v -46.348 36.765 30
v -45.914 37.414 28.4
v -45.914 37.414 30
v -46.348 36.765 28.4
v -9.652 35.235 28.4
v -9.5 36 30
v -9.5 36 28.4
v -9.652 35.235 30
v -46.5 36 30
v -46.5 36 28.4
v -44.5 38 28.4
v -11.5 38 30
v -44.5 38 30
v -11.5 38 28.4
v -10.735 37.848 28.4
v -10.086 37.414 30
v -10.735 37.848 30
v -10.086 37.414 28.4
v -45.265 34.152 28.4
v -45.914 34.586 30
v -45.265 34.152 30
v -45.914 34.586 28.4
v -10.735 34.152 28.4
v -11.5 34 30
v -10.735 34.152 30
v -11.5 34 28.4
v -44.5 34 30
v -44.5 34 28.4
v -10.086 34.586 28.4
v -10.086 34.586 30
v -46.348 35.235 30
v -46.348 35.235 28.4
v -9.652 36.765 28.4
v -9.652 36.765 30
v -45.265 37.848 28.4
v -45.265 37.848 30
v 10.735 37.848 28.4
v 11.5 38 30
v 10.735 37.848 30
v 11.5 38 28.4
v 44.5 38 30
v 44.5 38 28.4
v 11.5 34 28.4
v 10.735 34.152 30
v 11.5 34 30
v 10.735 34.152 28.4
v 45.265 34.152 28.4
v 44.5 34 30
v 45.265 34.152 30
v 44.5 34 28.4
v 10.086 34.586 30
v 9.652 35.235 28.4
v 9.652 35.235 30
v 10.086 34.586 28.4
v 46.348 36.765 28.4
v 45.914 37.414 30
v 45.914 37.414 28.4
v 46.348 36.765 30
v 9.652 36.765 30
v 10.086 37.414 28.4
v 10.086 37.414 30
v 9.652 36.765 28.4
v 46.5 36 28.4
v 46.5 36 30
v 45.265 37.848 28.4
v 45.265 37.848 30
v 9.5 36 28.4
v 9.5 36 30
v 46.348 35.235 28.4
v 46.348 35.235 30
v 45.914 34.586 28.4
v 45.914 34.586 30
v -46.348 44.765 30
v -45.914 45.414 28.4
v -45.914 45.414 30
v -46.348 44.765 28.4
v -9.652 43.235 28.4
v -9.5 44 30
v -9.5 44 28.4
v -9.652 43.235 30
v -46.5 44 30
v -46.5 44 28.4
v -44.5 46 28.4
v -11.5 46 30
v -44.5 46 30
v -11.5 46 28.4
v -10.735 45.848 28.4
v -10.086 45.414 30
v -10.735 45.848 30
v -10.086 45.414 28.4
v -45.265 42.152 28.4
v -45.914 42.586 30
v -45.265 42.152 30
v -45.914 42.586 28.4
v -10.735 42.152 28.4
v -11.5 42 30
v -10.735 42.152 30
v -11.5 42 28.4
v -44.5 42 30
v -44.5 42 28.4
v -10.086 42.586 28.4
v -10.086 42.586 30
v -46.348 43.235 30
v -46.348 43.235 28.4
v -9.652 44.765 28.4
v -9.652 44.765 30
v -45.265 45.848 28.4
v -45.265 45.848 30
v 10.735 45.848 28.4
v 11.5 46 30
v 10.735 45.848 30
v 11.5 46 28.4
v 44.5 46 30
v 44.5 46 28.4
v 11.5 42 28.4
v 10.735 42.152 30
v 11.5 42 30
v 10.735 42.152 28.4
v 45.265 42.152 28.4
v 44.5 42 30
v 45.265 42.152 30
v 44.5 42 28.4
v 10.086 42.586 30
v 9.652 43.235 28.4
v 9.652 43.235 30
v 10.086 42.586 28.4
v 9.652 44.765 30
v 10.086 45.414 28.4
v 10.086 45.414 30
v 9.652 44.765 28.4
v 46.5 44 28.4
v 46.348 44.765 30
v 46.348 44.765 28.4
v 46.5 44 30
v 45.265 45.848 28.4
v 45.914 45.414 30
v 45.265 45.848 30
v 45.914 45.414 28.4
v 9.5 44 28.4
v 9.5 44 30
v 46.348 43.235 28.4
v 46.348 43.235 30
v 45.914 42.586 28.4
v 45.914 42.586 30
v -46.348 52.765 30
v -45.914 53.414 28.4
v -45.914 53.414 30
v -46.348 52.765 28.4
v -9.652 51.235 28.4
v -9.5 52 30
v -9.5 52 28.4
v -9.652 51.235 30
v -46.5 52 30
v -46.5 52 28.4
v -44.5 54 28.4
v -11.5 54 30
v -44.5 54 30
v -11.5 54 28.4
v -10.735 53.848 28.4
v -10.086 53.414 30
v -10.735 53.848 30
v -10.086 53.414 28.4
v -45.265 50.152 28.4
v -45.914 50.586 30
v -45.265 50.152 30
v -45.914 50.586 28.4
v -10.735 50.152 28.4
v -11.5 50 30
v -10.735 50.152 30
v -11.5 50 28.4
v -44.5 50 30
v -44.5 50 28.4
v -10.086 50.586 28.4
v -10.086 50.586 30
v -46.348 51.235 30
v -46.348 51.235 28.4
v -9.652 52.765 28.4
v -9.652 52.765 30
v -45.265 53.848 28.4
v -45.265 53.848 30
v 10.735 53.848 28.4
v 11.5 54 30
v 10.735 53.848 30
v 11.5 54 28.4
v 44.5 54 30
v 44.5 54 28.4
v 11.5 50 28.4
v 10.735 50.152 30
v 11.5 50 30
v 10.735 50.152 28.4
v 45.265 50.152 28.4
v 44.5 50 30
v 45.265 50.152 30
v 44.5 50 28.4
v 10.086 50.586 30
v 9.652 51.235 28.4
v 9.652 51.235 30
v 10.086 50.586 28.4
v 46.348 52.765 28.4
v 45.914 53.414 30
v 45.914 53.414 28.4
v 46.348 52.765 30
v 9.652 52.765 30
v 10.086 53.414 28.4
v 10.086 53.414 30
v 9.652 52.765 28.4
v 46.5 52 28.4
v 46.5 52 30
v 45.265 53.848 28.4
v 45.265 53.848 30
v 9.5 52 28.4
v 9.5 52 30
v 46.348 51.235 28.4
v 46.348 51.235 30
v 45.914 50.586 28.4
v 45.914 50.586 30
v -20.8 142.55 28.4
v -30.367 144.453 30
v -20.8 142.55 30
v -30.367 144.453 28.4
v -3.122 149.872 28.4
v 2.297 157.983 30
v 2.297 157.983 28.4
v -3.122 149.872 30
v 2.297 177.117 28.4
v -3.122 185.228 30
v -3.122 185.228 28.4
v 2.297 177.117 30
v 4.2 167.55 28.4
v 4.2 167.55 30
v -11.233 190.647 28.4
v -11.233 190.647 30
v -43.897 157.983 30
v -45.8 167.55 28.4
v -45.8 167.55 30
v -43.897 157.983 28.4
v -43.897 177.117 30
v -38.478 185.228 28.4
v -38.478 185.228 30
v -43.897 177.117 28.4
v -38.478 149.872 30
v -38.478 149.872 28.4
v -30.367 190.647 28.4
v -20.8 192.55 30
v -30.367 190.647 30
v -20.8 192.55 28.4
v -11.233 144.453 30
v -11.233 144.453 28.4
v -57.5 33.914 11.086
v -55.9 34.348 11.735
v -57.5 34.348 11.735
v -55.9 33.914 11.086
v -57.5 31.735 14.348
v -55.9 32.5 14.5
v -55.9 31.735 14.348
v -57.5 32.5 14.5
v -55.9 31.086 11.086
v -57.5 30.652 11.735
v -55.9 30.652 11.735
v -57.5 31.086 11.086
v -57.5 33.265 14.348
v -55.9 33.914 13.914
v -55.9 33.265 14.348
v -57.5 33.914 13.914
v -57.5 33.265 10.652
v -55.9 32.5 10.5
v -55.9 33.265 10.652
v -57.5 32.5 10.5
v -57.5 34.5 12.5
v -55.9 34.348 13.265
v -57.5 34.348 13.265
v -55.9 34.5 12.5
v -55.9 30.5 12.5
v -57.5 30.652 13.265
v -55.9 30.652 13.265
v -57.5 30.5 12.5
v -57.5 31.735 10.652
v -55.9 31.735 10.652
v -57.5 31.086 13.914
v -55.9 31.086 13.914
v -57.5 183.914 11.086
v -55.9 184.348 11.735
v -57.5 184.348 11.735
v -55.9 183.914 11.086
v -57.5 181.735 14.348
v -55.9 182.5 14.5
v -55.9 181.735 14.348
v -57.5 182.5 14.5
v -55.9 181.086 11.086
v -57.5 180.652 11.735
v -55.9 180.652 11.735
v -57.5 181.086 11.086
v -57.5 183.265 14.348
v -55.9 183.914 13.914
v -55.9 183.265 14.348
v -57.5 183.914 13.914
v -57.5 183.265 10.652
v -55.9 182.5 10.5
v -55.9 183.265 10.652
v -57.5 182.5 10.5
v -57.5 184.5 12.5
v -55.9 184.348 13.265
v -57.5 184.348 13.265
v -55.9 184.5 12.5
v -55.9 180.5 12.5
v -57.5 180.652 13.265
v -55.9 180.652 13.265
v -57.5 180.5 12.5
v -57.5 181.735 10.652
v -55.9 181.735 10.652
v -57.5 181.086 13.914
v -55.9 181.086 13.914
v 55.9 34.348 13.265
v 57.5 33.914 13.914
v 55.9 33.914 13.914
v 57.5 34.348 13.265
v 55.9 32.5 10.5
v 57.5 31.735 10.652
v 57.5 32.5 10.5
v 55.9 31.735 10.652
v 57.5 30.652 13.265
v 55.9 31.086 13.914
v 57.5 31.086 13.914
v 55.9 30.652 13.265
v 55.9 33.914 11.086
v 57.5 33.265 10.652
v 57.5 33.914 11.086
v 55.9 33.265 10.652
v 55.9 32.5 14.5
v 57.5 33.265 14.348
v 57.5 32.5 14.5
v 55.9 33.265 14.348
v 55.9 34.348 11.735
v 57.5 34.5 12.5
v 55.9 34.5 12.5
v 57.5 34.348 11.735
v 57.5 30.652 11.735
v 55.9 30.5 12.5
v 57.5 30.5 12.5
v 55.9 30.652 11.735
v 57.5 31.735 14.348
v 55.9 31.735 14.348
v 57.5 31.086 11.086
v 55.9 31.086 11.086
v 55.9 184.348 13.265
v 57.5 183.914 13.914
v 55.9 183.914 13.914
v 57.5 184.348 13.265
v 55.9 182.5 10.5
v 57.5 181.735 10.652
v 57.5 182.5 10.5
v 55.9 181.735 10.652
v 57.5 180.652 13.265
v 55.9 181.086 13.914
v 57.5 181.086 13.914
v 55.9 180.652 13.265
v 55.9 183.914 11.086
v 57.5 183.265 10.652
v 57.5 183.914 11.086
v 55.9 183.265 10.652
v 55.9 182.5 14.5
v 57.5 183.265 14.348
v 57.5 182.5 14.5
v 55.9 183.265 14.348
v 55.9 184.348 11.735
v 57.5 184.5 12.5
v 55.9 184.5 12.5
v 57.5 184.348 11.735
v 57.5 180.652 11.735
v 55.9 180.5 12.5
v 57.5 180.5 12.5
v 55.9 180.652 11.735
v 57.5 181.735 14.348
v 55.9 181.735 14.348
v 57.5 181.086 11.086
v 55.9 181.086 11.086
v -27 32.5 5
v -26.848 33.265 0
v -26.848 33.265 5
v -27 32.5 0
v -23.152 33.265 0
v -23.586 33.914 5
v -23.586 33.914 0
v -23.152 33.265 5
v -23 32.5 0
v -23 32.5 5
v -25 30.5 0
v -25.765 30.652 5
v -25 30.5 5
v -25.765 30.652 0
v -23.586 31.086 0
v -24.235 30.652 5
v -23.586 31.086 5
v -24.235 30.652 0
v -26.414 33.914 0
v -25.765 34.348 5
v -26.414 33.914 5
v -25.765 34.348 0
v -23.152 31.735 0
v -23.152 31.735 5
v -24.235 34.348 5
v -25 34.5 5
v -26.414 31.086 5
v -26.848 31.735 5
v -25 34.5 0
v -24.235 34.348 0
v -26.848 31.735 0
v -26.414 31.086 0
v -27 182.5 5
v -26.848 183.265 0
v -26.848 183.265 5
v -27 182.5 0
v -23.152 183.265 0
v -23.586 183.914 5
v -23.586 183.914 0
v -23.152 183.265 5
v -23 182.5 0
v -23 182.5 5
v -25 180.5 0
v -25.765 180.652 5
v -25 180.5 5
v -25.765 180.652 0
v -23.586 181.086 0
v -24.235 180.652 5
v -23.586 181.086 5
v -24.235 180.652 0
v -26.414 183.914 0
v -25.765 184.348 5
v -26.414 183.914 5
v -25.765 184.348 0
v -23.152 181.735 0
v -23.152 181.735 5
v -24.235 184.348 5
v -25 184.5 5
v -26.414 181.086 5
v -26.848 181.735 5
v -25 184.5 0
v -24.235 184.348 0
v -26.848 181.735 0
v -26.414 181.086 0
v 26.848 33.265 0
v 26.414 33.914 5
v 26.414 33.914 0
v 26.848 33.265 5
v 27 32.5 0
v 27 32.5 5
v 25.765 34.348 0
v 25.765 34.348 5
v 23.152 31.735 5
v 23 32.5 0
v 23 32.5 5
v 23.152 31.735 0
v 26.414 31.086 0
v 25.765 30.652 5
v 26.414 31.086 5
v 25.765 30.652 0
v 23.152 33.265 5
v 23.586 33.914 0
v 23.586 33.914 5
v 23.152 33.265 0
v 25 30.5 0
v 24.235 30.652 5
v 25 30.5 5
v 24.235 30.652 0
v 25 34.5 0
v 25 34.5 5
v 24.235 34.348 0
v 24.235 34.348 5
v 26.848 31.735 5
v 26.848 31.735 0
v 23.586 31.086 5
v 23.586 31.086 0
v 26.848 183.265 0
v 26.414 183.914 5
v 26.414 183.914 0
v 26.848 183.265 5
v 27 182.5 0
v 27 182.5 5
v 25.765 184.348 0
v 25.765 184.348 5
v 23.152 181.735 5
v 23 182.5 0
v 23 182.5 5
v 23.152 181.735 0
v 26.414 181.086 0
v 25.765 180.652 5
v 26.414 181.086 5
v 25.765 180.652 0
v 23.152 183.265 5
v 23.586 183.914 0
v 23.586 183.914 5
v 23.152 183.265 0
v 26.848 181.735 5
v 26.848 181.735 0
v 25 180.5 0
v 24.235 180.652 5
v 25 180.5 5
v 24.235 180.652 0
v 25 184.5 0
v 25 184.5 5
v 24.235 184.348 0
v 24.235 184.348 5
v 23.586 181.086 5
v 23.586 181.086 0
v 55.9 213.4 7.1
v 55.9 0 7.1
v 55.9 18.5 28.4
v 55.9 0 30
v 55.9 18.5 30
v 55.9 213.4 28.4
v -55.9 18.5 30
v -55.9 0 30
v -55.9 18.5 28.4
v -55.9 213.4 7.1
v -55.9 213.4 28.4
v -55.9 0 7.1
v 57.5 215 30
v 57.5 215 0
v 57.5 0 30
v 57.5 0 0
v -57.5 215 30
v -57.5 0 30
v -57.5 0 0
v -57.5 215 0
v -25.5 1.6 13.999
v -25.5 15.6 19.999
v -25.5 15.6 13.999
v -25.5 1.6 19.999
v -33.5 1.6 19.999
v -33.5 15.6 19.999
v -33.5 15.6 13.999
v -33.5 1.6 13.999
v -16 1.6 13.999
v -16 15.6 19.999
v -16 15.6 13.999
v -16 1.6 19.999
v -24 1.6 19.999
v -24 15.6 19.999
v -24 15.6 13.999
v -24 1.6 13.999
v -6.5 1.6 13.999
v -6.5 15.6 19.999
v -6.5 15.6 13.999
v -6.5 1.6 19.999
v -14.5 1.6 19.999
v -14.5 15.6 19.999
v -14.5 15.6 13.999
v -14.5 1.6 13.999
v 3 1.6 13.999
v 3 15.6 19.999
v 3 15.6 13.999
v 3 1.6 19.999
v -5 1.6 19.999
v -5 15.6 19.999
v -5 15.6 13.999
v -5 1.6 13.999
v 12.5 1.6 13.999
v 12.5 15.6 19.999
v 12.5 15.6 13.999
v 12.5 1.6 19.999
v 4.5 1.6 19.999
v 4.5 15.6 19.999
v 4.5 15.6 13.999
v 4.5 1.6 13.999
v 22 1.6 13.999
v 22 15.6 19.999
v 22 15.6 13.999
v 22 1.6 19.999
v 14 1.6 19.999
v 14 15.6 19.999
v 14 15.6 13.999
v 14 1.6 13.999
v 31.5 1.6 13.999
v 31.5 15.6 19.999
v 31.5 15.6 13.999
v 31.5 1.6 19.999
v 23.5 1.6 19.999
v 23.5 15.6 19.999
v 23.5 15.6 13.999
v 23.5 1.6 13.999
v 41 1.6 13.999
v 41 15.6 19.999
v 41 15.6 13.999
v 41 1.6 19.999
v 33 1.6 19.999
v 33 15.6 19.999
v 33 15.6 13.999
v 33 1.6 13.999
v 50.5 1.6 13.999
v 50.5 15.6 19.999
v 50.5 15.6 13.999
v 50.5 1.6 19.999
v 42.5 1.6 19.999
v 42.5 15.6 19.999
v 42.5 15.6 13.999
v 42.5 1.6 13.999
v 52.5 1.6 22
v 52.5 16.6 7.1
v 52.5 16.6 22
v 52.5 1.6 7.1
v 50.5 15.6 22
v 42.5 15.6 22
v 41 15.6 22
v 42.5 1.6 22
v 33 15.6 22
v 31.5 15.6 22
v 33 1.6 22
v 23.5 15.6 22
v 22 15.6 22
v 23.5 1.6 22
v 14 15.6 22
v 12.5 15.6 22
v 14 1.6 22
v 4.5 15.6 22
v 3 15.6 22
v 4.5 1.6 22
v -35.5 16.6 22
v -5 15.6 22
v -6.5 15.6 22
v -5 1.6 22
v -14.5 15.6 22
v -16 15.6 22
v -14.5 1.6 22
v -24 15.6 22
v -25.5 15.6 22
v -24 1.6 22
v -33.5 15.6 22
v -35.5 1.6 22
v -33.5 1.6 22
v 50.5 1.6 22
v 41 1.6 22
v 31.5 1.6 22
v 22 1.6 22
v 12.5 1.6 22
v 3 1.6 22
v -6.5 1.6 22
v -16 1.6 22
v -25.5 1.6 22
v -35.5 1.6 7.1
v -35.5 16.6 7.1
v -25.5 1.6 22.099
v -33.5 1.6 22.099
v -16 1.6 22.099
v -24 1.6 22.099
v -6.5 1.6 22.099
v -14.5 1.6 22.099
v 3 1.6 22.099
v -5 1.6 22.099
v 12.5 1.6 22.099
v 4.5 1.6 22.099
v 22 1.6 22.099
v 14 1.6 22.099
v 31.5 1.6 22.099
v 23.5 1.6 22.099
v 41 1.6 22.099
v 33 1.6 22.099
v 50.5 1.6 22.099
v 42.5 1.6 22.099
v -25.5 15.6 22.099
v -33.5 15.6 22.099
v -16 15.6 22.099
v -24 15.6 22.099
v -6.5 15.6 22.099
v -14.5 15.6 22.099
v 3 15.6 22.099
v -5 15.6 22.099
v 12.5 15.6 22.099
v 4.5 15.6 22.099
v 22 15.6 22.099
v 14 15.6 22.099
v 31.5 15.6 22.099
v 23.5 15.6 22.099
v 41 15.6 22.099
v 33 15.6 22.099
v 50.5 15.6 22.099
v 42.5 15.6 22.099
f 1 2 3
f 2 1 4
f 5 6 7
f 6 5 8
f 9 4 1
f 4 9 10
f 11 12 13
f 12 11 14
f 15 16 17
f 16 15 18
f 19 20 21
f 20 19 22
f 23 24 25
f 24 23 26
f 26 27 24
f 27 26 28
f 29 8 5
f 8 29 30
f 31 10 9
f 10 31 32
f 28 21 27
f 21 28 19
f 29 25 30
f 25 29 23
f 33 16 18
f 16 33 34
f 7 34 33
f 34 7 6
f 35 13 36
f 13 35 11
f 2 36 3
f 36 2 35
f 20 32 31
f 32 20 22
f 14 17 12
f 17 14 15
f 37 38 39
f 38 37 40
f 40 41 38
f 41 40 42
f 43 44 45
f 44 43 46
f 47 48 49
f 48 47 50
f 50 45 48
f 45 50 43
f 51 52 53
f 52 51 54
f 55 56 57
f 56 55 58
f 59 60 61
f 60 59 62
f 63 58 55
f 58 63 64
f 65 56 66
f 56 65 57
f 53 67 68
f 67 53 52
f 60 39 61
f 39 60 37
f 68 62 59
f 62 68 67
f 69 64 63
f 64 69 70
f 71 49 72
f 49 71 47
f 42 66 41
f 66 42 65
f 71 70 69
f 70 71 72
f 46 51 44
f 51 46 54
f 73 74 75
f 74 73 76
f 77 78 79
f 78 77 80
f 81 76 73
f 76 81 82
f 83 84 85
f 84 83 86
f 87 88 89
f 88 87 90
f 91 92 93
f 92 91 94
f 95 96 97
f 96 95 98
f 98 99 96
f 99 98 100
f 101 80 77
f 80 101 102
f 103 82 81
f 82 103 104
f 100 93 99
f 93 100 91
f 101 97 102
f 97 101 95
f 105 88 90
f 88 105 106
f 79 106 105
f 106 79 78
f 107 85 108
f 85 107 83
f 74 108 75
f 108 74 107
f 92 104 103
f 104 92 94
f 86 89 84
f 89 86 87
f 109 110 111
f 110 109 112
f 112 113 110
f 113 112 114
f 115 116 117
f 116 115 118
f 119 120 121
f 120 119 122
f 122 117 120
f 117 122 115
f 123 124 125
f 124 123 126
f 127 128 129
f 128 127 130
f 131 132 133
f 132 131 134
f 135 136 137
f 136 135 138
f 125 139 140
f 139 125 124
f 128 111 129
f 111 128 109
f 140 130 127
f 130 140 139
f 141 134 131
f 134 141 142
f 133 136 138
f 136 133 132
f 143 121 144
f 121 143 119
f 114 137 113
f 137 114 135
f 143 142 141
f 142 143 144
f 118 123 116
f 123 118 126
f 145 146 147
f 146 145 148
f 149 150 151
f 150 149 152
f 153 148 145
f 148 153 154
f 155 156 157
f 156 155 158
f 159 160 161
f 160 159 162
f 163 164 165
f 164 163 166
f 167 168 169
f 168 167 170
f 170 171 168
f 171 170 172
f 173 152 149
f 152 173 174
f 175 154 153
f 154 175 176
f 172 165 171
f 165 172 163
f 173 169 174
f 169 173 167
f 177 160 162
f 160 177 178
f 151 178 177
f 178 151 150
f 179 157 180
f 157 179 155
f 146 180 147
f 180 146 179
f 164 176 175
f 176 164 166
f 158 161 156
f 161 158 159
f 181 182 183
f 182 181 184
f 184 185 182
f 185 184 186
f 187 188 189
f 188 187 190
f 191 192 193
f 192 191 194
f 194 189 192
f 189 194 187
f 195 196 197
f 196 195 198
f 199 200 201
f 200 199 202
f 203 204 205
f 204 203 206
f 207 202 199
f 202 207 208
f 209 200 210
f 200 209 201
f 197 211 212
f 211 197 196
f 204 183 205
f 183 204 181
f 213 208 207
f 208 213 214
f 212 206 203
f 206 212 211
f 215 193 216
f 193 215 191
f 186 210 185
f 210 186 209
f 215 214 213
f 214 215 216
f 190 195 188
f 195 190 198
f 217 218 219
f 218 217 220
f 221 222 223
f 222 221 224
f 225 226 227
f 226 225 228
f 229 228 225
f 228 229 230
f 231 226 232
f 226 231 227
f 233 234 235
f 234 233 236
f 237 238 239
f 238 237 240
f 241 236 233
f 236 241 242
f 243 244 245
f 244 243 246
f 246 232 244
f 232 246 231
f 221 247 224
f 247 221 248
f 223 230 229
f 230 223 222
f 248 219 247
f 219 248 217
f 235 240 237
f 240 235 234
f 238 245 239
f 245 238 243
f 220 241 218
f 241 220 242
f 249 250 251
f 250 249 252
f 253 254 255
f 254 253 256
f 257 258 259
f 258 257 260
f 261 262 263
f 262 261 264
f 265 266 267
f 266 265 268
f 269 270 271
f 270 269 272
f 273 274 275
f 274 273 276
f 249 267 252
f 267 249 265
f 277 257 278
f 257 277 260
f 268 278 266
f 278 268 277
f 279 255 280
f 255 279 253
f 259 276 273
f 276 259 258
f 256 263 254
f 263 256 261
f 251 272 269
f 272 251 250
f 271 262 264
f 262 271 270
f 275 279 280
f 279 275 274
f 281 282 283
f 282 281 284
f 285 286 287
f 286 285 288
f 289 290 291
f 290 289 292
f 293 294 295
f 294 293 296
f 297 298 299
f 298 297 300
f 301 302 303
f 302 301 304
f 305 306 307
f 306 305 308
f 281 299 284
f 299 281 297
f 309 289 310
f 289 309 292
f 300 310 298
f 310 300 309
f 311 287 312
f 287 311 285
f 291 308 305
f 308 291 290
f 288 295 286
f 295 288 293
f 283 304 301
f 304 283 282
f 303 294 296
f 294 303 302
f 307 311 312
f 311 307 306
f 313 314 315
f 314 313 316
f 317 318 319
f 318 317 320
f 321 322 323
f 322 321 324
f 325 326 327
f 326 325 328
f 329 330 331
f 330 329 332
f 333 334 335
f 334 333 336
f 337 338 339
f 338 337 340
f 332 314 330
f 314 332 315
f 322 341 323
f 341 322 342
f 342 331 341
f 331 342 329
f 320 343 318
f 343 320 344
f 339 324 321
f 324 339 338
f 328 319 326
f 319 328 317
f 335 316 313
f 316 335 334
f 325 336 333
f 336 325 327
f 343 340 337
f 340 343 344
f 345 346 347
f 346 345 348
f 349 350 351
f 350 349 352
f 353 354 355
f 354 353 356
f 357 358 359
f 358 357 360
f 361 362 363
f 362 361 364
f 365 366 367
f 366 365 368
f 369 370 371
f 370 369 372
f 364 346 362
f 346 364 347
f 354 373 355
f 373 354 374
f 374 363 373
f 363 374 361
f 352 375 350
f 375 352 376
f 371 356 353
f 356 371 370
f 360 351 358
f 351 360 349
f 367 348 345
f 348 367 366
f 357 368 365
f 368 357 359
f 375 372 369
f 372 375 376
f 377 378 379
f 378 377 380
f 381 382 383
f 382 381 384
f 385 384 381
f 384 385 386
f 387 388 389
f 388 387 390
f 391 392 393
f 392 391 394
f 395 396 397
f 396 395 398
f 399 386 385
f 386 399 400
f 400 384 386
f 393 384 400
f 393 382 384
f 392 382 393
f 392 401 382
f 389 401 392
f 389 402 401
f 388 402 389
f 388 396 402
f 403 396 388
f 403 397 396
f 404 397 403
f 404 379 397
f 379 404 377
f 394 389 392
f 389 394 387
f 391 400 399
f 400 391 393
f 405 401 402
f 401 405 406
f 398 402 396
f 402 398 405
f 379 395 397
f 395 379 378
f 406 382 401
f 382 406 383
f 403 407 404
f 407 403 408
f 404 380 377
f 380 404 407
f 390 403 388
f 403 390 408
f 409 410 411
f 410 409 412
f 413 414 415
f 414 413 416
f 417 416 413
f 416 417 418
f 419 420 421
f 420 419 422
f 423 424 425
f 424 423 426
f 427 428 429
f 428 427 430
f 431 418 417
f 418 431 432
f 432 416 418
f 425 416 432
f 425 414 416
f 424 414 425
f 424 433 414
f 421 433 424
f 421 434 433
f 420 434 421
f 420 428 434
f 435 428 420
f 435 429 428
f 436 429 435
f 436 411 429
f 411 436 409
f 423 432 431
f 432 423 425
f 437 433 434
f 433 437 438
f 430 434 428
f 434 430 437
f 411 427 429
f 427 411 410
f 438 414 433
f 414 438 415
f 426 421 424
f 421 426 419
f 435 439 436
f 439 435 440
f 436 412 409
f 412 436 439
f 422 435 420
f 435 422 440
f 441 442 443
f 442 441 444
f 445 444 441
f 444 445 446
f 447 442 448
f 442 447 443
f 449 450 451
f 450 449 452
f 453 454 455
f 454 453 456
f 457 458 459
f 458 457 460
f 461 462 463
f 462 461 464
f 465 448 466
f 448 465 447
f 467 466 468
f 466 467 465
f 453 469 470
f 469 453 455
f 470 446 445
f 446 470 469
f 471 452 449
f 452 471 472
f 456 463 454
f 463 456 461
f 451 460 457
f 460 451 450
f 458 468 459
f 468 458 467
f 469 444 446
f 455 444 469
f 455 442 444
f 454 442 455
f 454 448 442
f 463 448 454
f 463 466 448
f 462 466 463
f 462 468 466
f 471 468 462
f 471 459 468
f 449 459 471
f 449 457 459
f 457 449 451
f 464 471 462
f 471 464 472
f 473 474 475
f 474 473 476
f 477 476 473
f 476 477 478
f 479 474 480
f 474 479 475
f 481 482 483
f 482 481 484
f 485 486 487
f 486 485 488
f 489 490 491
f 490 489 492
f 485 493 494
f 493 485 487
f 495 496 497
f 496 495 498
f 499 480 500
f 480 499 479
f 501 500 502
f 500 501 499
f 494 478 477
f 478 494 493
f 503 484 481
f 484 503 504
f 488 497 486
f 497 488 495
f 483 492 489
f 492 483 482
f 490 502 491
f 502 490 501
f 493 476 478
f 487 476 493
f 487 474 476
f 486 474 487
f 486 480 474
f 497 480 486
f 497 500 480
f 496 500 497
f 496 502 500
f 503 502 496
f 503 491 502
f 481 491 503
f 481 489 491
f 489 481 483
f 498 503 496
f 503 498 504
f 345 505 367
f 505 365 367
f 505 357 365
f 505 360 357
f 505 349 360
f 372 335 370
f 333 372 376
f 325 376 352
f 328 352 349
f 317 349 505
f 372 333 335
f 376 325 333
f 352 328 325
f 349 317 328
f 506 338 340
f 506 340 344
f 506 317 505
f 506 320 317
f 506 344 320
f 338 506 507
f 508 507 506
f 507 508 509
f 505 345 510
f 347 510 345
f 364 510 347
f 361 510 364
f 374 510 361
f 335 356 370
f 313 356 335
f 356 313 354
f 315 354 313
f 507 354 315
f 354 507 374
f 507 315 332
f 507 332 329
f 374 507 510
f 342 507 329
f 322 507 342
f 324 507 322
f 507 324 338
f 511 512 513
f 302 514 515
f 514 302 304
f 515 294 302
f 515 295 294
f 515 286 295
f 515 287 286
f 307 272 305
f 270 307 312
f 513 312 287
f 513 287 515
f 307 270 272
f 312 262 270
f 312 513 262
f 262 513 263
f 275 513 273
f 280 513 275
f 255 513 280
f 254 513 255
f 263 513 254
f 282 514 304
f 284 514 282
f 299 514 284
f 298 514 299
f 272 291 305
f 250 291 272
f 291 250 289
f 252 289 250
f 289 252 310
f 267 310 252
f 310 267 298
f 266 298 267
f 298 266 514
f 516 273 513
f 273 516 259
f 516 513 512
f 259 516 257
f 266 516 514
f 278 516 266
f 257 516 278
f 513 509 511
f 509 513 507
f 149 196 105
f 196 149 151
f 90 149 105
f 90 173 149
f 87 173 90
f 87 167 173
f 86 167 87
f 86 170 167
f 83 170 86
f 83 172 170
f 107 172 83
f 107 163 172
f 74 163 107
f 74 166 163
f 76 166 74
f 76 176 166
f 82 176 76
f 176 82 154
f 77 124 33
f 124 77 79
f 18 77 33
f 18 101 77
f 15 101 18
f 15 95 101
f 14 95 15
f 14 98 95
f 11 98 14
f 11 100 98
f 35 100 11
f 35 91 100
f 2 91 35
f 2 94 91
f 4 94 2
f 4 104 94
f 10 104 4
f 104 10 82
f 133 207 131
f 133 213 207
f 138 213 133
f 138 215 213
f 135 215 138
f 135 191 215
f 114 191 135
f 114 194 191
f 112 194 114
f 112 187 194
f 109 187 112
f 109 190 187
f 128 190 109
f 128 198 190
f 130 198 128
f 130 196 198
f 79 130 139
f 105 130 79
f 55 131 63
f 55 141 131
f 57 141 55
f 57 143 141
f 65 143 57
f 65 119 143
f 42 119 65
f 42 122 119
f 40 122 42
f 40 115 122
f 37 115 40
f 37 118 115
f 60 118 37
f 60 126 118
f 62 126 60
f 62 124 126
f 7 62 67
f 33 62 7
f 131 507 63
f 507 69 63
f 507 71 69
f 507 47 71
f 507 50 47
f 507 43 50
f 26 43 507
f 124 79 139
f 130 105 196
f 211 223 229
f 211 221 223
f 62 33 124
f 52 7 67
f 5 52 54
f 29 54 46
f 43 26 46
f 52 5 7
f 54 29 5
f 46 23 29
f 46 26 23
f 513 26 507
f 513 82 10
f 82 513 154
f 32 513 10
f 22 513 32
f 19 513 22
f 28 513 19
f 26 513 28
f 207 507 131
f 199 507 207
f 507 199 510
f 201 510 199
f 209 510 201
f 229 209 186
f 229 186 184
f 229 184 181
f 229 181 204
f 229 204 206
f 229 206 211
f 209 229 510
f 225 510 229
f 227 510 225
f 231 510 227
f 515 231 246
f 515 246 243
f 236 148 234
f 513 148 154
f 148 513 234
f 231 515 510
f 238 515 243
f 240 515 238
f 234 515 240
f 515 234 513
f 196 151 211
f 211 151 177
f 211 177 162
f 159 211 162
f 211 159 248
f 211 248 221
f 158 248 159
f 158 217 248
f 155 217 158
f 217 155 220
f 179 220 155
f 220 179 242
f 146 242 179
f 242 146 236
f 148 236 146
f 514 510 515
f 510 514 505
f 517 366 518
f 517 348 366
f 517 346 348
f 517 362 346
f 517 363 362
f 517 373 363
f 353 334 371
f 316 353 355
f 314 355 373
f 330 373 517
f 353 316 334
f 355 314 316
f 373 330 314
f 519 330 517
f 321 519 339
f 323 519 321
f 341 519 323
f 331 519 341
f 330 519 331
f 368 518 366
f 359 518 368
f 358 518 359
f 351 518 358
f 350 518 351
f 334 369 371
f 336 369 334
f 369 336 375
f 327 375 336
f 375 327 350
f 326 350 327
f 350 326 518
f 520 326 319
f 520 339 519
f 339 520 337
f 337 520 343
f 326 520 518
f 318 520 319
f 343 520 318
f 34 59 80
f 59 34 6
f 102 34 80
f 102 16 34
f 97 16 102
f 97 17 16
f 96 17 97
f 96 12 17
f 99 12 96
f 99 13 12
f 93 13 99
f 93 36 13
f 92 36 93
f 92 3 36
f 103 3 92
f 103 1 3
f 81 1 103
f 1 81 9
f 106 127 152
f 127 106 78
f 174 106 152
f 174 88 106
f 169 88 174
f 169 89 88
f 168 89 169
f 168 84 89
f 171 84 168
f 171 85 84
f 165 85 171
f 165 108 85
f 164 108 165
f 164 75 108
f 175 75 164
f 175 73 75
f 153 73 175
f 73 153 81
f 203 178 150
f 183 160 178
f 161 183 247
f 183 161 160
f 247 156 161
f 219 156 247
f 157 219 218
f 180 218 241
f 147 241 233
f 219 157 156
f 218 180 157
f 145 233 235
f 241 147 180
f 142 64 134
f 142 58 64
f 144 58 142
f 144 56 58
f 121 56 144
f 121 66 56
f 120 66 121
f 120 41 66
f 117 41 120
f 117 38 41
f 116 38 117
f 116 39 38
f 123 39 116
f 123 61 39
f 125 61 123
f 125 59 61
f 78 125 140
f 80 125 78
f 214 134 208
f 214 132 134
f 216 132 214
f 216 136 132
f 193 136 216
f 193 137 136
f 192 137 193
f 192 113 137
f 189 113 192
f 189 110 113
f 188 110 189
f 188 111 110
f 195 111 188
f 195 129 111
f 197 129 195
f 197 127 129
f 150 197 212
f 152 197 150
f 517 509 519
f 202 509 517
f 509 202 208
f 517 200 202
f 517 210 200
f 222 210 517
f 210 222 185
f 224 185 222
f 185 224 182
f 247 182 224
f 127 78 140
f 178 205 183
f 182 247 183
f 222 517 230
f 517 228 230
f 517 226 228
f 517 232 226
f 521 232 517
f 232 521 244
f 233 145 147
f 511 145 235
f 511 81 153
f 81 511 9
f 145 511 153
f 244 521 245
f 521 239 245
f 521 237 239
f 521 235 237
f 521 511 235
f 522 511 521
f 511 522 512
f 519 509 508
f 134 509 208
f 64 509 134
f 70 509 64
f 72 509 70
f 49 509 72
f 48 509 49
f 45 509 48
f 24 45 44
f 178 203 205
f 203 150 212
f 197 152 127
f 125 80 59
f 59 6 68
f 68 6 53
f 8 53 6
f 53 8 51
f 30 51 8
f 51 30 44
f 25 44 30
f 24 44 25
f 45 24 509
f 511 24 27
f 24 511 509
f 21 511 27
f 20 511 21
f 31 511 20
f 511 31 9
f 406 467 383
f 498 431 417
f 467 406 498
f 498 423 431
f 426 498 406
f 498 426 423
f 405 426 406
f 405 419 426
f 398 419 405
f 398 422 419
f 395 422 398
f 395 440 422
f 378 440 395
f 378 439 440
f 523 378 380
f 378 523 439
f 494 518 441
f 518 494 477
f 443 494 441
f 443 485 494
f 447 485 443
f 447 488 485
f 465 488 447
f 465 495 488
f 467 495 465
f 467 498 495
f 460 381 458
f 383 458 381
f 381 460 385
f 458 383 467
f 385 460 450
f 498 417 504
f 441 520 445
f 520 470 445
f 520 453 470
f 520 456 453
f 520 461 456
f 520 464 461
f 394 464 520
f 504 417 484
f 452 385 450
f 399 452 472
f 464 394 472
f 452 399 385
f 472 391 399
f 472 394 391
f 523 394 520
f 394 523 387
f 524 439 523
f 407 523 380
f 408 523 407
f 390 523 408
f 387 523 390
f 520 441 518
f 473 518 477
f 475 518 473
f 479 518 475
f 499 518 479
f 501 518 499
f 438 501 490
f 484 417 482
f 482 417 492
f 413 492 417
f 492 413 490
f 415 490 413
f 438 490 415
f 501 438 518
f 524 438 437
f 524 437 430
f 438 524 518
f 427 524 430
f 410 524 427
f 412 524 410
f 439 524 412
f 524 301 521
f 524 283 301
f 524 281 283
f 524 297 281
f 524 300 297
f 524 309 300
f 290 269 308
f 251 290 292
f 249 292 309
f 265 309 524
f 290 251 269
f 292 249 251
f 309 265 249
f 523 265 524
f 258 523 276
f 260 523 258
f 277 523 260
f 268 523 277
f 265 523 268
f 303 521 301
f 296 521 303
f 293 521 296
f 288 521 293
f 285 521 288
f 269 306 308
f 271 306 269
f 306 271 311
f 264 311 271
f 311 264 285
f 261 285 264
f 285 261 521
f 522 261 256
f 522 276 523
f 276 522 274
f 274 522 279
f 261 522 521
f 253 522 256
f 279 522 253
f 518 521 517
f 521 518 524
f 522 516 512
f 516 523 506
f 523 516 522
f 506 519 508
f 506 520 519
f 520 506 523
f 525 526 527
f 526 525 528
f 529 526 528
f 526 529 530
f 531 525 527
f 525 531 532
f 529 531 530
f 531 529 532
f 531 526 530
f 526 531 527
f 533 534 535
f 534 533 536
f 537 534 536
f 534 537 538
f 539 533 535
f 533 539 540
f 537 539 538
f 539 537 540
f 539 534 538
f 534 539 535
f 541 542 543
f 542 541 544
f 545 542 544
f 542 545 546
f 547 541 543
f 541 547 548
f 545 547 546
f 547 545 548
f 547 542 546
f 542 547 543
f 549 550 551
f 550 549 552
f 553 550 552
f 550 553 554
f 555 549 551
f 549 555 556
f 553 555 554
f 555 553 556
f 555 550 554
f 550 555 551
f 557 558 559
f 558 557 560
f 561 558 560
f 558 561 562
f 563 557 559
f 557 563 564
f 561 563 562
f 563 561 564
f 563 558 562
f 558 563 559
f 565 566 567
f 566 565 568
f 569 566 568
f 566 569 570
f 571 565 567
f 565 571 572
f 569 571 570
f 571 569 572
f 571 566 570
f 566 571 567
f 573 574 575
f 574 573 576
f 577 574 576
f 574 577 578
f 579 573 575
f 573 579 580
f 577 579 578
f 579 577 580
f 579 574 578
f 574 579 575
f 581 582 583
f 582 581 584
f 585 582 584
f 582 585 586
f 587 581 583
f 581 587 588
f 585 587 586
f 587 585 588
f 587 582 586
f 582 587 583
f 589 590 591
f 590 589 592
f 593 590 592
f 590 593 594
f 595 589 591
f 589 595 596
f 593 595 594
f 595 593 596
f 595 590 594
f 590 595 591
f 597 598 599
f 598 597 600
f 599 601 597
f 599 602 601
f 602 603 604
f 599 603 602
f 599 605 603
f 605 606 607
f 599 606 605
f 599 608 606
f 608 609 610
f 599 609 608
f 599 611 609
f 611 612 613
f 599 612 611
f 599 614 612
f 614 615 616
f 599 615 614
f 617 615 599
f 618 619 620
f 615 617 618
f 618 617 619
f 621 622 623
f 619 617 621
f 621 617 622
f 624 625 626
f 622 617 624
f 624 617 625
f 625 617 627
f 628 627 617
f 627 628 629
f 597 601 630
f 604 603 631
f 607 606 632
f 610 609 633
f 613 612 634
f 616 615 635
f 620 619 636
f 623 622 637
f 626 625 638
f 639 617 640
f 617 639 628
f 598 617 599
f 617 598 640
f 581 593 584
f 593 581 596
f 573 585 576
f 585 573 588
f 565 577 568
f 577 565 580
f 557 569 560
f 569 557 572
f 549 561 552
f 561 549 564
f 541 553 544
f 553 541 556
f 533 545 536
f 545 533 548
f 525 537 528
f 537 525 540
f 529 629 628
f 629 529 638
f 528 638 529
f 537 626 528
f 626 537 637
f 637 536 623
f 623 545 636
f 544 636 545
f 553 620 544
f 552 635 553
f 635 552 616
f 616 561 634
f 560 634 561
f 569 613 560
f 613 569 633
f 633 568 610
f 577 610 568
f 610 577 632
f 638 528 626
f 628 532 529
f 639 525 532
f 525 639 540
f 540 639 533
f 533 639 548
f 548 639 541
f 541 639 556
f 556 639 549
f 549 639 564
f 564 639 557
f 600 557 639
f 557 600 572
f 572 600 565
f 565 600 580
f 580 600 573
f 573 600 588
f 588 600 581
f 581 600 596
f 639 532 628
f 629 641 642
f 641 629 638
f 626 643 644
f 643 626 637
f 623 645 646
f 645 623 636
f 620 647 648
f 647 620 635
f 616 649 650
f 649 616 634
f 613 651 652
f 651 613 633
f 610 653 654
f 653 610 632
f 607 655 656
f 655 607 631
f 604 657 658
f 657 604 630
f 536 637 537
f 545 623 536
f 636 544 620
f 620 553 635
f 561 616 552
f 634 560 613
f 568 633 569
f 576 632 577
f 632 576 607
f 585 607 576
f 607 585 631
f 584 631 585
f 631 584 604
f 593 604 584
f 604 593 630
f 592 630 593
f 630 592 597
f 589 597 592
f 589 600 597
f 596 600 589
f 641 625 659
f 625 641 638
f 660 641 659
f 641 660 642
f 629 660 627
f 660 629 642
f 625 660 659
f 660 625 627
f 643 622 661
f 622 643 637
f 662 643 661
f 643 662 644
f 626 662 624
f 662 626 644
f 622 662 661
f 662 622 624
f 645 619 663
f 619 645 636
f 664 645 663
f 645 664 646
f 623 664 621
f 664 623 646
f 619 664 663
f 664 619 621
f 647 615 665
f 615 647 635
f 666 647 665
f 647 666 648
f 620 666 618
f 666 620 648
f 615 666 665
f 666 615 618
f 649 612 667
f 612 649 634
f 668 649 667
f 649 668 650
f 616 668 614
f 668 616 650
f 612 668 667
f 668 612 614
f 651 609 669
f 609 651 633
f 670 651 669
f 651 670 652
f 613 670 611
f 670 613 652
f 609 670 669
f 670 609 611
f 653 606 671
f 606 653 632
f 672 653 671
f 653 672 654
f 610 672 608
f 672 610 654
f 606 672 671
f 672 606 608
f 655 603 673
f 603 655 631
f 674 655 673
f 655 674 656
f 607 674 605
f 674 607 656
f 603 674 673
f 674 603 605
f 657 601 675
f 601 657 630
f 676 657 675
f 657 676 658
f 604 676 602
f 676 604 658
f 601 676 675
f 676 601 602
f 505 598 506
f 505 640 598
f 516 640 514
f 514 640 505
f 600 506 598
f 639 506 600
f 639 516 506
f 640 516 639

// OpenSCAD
e=.001;
$fn=16;

mw_lrs_w=115;
mw_lrs_h=30;
mw_lrs_d=215;


mw_lrs_holes_pitch_d  = 150;
mw_lrs_holes_pitch_w  = 50;
mw_lrs_holes_height_h = 12.5;

mw_lrs_gap_h = 23;
mw_lrs_gap_d = 18.5;

mw_lrs_case_thickness = 1.6;

m4_thread = 4;

mw_lrs_screw_terminal_x=8.5;
mw_lrs_screw_terminal_w=88;
mw_lrs_screw_terminal_d=15;
mw_lrs_screw_terminal_h=15;
mw_lrs_screw_terminal_pitch = 9.5;
mw_lrs_screw_terminal_gap_w = 8;
mw_lrs_screw_terminal_gap_d = 14;
mw_lrs_screw_terminal_gap_z = 7;
mw_lrs_screw_terminal_gap_h = 6;

module mw_lrs_side_holes()
{
	translate( [0, 0, mw_lrs_holes_height_h] )
	for( r = [ 0, 180 ] )
	rotate( [0, r, 0] )
	for( y = [ (mw_lrs_d-mw_lrs_holes_pitch_d)/2, (mw_lrs_d+mw_lrs_holes_pitch_d)/2 ] )
	translate( [-mw_lrs_w/2, y, 0] )
	rotate( [0, 90, 0] )
	children();
}

module mw_lrs_bottom_holes()
{
	for( x = [ -mw_lrs_holes_pitch_w/2, mw_lrs_holes_pitch_w/2 ] )
	for( y = [ (mw_lrs_d-mw_lrs_holes_pitch_d)/2, (mw_lrs_d+mw_lrs_holes_pitch_d)/2 ] )
	translate( [x, y, 0] )
	children();
}

module mw_lrs_holes()
{
	mw_lrs_side_holes() children();
	mw_lrs_bottom_holes() children();
}

module mw_lrs_screw_terminal()
{
	colors = [
		"red", "red", "red",
		"black", "black", "black",
		"green", "blue", "brown",
	];
	b=1;
	translate([mw_lrs_screw_terminal_x, mw_lrs_case_thickness, mw_lrs_h-mw_lrs_gap_h-e])
	{
		difference()
		{
			translate([-mw_lrs_screw_terminal_w/2, 0, 0])
			cube([mw_lrs_screw_terminal_w, mw_lrs_screw_terminal_d, mw_lrs_screw_terminal_h+e]);
			for (i=[0:8])
			translate([(i-4)*9.5-mw_lrs_screw_terminal_gap_w/2, -b, mw_lrs_screw_terminal_gap_z])
			cube([mw_lrs_screw_terminal_gap_w, mw_lrs_screw_terminal_gap_d+b, mw_lrs_screw_terminal_gap_h]);
		}

		for (i=[0:8])
		translate([(i-4)*9.5-mw_lrs_screw_terminal_gap_w/2, -0, mw_lrs_screw_terminal_h])
		color(colors[i])
		cube([mw_lrs_screw_terminal_gap_w,mw_lrs_screw_terminal_gap_d,.1]);

	}
}

module mw_lrs_vents()
{
	b=1;
	hole=4;
	for (y = [36, 44, 52])
	for (i = [-1, 1])
	hull()
	{
		translate([i*(19/2+hole/2), y, mw_lrs_h-mw_lrs_case_thickness-b])
			cylinder(mw_lrs_case_thickness+2*b, r=hole/2);

		translate([i*(19/2+hole/2+33), y, mw_lrs_h-mw_lrs_case_thickness-b])
			cylinder(mw_lrs_case_thickness+2*b, r=hole/2);
	}

	translate([-mw_lrs_w/2+36.7, mw_lrs_d-47.45,mw_lrs_h-mw_lrs_case_thickness-b])
		cylinder(mw_lrs_case_thickness+2*b, r=50/2);
}

module mw_lrs_vents_keepout(h, margin=0)
{
	b=1;
	hole=4;
	hull()
	for (y = [36, 44, 52])
	for (i = [-1, 1])
	{
		translate([i*(19/2+hole/2), y, mw_lrs_h-b])
			cylinder(h+b, r=hole/2+margin);

		translate([i*(19/2+hole/2+33), y, mw_lrs_h-b])
			cylinder(h+b, r=hole/2+margin);
	}

	translate([-mw_lrs_w/2+36.7, mw_lrs_d-47.45,mw_lrs_h-b])
		cylinder(h+b, r=50/2);
}

module mw_lrs()
{
	b=1; 

	union()
	{
		color([.75,.75,.75])
		difference()
		{

			translate([-mw_lrs_w/2,0,0])
			cube([mw_lrs_w, mw_lrs_d, mw_lrs_h]);

			union()
			{
				translate([-mw_lrs_w/2+mw_lrs_case_thickness, -b, mw_lrs_h-mw_lrs_gap_h] )
				cube( [ mw_lrs_w-2*mw_lrs_case_thickness, b+mw_lrs_gap_d, mw_lrs_gap_h+b] );

				translate([-mw_lrs_w/2+mw_lrs_case_thickness, mw_lrs_gap_d-e, mw_lrs_h-mw_lrs_gap_h] )
				cube( [ mw_lrs_w-2*mw_lrs_case_thickness, mw_lrs_d-mw_lrs_gap_d+e-mw_lrs_case_thickness, mw_lrs_gap_h-mw_lrs_case_thickness] );

				mw_lrs_vents();

				mw_lrs_holes()
				{
					translate([0,0,-e])
					cylinder(h=5+e, r=m4_thread/2);
				}
			}
		}
		color([.1, .3, .1])
		translate([-mw_lrs_w/2+mw_lrs_case_thickness, 0, mw_lrs_h-mw_lrs_gap_h-e])
		cube([mw_lrs_w-2*mw_lrs_case_thickness, mw_lrs_d-mw_lrs_case_thickness, e+.1]);
		mw_lrs_screw_terminal();
	}
}

module mw_lrs_keepout(margin=0, e=0)
{
	b=1; 

	w=mw_lrs_w+margin*2;
	d=mw_lrs_d+margin*2;
	h=mw_lrs_h+margin*2;

	translate([-w/2,-margin,-margin])
	cube([w, d, h]);
}

mw_lrs();
%mw_lrs_keepout(margin=.4);

module m4_hole(h)
{
	translate([0,0,-h])
	cylinder(h=h+e, r=m4_thread/2);
}

%mw_lrs_holes()
m4_hole(10);
